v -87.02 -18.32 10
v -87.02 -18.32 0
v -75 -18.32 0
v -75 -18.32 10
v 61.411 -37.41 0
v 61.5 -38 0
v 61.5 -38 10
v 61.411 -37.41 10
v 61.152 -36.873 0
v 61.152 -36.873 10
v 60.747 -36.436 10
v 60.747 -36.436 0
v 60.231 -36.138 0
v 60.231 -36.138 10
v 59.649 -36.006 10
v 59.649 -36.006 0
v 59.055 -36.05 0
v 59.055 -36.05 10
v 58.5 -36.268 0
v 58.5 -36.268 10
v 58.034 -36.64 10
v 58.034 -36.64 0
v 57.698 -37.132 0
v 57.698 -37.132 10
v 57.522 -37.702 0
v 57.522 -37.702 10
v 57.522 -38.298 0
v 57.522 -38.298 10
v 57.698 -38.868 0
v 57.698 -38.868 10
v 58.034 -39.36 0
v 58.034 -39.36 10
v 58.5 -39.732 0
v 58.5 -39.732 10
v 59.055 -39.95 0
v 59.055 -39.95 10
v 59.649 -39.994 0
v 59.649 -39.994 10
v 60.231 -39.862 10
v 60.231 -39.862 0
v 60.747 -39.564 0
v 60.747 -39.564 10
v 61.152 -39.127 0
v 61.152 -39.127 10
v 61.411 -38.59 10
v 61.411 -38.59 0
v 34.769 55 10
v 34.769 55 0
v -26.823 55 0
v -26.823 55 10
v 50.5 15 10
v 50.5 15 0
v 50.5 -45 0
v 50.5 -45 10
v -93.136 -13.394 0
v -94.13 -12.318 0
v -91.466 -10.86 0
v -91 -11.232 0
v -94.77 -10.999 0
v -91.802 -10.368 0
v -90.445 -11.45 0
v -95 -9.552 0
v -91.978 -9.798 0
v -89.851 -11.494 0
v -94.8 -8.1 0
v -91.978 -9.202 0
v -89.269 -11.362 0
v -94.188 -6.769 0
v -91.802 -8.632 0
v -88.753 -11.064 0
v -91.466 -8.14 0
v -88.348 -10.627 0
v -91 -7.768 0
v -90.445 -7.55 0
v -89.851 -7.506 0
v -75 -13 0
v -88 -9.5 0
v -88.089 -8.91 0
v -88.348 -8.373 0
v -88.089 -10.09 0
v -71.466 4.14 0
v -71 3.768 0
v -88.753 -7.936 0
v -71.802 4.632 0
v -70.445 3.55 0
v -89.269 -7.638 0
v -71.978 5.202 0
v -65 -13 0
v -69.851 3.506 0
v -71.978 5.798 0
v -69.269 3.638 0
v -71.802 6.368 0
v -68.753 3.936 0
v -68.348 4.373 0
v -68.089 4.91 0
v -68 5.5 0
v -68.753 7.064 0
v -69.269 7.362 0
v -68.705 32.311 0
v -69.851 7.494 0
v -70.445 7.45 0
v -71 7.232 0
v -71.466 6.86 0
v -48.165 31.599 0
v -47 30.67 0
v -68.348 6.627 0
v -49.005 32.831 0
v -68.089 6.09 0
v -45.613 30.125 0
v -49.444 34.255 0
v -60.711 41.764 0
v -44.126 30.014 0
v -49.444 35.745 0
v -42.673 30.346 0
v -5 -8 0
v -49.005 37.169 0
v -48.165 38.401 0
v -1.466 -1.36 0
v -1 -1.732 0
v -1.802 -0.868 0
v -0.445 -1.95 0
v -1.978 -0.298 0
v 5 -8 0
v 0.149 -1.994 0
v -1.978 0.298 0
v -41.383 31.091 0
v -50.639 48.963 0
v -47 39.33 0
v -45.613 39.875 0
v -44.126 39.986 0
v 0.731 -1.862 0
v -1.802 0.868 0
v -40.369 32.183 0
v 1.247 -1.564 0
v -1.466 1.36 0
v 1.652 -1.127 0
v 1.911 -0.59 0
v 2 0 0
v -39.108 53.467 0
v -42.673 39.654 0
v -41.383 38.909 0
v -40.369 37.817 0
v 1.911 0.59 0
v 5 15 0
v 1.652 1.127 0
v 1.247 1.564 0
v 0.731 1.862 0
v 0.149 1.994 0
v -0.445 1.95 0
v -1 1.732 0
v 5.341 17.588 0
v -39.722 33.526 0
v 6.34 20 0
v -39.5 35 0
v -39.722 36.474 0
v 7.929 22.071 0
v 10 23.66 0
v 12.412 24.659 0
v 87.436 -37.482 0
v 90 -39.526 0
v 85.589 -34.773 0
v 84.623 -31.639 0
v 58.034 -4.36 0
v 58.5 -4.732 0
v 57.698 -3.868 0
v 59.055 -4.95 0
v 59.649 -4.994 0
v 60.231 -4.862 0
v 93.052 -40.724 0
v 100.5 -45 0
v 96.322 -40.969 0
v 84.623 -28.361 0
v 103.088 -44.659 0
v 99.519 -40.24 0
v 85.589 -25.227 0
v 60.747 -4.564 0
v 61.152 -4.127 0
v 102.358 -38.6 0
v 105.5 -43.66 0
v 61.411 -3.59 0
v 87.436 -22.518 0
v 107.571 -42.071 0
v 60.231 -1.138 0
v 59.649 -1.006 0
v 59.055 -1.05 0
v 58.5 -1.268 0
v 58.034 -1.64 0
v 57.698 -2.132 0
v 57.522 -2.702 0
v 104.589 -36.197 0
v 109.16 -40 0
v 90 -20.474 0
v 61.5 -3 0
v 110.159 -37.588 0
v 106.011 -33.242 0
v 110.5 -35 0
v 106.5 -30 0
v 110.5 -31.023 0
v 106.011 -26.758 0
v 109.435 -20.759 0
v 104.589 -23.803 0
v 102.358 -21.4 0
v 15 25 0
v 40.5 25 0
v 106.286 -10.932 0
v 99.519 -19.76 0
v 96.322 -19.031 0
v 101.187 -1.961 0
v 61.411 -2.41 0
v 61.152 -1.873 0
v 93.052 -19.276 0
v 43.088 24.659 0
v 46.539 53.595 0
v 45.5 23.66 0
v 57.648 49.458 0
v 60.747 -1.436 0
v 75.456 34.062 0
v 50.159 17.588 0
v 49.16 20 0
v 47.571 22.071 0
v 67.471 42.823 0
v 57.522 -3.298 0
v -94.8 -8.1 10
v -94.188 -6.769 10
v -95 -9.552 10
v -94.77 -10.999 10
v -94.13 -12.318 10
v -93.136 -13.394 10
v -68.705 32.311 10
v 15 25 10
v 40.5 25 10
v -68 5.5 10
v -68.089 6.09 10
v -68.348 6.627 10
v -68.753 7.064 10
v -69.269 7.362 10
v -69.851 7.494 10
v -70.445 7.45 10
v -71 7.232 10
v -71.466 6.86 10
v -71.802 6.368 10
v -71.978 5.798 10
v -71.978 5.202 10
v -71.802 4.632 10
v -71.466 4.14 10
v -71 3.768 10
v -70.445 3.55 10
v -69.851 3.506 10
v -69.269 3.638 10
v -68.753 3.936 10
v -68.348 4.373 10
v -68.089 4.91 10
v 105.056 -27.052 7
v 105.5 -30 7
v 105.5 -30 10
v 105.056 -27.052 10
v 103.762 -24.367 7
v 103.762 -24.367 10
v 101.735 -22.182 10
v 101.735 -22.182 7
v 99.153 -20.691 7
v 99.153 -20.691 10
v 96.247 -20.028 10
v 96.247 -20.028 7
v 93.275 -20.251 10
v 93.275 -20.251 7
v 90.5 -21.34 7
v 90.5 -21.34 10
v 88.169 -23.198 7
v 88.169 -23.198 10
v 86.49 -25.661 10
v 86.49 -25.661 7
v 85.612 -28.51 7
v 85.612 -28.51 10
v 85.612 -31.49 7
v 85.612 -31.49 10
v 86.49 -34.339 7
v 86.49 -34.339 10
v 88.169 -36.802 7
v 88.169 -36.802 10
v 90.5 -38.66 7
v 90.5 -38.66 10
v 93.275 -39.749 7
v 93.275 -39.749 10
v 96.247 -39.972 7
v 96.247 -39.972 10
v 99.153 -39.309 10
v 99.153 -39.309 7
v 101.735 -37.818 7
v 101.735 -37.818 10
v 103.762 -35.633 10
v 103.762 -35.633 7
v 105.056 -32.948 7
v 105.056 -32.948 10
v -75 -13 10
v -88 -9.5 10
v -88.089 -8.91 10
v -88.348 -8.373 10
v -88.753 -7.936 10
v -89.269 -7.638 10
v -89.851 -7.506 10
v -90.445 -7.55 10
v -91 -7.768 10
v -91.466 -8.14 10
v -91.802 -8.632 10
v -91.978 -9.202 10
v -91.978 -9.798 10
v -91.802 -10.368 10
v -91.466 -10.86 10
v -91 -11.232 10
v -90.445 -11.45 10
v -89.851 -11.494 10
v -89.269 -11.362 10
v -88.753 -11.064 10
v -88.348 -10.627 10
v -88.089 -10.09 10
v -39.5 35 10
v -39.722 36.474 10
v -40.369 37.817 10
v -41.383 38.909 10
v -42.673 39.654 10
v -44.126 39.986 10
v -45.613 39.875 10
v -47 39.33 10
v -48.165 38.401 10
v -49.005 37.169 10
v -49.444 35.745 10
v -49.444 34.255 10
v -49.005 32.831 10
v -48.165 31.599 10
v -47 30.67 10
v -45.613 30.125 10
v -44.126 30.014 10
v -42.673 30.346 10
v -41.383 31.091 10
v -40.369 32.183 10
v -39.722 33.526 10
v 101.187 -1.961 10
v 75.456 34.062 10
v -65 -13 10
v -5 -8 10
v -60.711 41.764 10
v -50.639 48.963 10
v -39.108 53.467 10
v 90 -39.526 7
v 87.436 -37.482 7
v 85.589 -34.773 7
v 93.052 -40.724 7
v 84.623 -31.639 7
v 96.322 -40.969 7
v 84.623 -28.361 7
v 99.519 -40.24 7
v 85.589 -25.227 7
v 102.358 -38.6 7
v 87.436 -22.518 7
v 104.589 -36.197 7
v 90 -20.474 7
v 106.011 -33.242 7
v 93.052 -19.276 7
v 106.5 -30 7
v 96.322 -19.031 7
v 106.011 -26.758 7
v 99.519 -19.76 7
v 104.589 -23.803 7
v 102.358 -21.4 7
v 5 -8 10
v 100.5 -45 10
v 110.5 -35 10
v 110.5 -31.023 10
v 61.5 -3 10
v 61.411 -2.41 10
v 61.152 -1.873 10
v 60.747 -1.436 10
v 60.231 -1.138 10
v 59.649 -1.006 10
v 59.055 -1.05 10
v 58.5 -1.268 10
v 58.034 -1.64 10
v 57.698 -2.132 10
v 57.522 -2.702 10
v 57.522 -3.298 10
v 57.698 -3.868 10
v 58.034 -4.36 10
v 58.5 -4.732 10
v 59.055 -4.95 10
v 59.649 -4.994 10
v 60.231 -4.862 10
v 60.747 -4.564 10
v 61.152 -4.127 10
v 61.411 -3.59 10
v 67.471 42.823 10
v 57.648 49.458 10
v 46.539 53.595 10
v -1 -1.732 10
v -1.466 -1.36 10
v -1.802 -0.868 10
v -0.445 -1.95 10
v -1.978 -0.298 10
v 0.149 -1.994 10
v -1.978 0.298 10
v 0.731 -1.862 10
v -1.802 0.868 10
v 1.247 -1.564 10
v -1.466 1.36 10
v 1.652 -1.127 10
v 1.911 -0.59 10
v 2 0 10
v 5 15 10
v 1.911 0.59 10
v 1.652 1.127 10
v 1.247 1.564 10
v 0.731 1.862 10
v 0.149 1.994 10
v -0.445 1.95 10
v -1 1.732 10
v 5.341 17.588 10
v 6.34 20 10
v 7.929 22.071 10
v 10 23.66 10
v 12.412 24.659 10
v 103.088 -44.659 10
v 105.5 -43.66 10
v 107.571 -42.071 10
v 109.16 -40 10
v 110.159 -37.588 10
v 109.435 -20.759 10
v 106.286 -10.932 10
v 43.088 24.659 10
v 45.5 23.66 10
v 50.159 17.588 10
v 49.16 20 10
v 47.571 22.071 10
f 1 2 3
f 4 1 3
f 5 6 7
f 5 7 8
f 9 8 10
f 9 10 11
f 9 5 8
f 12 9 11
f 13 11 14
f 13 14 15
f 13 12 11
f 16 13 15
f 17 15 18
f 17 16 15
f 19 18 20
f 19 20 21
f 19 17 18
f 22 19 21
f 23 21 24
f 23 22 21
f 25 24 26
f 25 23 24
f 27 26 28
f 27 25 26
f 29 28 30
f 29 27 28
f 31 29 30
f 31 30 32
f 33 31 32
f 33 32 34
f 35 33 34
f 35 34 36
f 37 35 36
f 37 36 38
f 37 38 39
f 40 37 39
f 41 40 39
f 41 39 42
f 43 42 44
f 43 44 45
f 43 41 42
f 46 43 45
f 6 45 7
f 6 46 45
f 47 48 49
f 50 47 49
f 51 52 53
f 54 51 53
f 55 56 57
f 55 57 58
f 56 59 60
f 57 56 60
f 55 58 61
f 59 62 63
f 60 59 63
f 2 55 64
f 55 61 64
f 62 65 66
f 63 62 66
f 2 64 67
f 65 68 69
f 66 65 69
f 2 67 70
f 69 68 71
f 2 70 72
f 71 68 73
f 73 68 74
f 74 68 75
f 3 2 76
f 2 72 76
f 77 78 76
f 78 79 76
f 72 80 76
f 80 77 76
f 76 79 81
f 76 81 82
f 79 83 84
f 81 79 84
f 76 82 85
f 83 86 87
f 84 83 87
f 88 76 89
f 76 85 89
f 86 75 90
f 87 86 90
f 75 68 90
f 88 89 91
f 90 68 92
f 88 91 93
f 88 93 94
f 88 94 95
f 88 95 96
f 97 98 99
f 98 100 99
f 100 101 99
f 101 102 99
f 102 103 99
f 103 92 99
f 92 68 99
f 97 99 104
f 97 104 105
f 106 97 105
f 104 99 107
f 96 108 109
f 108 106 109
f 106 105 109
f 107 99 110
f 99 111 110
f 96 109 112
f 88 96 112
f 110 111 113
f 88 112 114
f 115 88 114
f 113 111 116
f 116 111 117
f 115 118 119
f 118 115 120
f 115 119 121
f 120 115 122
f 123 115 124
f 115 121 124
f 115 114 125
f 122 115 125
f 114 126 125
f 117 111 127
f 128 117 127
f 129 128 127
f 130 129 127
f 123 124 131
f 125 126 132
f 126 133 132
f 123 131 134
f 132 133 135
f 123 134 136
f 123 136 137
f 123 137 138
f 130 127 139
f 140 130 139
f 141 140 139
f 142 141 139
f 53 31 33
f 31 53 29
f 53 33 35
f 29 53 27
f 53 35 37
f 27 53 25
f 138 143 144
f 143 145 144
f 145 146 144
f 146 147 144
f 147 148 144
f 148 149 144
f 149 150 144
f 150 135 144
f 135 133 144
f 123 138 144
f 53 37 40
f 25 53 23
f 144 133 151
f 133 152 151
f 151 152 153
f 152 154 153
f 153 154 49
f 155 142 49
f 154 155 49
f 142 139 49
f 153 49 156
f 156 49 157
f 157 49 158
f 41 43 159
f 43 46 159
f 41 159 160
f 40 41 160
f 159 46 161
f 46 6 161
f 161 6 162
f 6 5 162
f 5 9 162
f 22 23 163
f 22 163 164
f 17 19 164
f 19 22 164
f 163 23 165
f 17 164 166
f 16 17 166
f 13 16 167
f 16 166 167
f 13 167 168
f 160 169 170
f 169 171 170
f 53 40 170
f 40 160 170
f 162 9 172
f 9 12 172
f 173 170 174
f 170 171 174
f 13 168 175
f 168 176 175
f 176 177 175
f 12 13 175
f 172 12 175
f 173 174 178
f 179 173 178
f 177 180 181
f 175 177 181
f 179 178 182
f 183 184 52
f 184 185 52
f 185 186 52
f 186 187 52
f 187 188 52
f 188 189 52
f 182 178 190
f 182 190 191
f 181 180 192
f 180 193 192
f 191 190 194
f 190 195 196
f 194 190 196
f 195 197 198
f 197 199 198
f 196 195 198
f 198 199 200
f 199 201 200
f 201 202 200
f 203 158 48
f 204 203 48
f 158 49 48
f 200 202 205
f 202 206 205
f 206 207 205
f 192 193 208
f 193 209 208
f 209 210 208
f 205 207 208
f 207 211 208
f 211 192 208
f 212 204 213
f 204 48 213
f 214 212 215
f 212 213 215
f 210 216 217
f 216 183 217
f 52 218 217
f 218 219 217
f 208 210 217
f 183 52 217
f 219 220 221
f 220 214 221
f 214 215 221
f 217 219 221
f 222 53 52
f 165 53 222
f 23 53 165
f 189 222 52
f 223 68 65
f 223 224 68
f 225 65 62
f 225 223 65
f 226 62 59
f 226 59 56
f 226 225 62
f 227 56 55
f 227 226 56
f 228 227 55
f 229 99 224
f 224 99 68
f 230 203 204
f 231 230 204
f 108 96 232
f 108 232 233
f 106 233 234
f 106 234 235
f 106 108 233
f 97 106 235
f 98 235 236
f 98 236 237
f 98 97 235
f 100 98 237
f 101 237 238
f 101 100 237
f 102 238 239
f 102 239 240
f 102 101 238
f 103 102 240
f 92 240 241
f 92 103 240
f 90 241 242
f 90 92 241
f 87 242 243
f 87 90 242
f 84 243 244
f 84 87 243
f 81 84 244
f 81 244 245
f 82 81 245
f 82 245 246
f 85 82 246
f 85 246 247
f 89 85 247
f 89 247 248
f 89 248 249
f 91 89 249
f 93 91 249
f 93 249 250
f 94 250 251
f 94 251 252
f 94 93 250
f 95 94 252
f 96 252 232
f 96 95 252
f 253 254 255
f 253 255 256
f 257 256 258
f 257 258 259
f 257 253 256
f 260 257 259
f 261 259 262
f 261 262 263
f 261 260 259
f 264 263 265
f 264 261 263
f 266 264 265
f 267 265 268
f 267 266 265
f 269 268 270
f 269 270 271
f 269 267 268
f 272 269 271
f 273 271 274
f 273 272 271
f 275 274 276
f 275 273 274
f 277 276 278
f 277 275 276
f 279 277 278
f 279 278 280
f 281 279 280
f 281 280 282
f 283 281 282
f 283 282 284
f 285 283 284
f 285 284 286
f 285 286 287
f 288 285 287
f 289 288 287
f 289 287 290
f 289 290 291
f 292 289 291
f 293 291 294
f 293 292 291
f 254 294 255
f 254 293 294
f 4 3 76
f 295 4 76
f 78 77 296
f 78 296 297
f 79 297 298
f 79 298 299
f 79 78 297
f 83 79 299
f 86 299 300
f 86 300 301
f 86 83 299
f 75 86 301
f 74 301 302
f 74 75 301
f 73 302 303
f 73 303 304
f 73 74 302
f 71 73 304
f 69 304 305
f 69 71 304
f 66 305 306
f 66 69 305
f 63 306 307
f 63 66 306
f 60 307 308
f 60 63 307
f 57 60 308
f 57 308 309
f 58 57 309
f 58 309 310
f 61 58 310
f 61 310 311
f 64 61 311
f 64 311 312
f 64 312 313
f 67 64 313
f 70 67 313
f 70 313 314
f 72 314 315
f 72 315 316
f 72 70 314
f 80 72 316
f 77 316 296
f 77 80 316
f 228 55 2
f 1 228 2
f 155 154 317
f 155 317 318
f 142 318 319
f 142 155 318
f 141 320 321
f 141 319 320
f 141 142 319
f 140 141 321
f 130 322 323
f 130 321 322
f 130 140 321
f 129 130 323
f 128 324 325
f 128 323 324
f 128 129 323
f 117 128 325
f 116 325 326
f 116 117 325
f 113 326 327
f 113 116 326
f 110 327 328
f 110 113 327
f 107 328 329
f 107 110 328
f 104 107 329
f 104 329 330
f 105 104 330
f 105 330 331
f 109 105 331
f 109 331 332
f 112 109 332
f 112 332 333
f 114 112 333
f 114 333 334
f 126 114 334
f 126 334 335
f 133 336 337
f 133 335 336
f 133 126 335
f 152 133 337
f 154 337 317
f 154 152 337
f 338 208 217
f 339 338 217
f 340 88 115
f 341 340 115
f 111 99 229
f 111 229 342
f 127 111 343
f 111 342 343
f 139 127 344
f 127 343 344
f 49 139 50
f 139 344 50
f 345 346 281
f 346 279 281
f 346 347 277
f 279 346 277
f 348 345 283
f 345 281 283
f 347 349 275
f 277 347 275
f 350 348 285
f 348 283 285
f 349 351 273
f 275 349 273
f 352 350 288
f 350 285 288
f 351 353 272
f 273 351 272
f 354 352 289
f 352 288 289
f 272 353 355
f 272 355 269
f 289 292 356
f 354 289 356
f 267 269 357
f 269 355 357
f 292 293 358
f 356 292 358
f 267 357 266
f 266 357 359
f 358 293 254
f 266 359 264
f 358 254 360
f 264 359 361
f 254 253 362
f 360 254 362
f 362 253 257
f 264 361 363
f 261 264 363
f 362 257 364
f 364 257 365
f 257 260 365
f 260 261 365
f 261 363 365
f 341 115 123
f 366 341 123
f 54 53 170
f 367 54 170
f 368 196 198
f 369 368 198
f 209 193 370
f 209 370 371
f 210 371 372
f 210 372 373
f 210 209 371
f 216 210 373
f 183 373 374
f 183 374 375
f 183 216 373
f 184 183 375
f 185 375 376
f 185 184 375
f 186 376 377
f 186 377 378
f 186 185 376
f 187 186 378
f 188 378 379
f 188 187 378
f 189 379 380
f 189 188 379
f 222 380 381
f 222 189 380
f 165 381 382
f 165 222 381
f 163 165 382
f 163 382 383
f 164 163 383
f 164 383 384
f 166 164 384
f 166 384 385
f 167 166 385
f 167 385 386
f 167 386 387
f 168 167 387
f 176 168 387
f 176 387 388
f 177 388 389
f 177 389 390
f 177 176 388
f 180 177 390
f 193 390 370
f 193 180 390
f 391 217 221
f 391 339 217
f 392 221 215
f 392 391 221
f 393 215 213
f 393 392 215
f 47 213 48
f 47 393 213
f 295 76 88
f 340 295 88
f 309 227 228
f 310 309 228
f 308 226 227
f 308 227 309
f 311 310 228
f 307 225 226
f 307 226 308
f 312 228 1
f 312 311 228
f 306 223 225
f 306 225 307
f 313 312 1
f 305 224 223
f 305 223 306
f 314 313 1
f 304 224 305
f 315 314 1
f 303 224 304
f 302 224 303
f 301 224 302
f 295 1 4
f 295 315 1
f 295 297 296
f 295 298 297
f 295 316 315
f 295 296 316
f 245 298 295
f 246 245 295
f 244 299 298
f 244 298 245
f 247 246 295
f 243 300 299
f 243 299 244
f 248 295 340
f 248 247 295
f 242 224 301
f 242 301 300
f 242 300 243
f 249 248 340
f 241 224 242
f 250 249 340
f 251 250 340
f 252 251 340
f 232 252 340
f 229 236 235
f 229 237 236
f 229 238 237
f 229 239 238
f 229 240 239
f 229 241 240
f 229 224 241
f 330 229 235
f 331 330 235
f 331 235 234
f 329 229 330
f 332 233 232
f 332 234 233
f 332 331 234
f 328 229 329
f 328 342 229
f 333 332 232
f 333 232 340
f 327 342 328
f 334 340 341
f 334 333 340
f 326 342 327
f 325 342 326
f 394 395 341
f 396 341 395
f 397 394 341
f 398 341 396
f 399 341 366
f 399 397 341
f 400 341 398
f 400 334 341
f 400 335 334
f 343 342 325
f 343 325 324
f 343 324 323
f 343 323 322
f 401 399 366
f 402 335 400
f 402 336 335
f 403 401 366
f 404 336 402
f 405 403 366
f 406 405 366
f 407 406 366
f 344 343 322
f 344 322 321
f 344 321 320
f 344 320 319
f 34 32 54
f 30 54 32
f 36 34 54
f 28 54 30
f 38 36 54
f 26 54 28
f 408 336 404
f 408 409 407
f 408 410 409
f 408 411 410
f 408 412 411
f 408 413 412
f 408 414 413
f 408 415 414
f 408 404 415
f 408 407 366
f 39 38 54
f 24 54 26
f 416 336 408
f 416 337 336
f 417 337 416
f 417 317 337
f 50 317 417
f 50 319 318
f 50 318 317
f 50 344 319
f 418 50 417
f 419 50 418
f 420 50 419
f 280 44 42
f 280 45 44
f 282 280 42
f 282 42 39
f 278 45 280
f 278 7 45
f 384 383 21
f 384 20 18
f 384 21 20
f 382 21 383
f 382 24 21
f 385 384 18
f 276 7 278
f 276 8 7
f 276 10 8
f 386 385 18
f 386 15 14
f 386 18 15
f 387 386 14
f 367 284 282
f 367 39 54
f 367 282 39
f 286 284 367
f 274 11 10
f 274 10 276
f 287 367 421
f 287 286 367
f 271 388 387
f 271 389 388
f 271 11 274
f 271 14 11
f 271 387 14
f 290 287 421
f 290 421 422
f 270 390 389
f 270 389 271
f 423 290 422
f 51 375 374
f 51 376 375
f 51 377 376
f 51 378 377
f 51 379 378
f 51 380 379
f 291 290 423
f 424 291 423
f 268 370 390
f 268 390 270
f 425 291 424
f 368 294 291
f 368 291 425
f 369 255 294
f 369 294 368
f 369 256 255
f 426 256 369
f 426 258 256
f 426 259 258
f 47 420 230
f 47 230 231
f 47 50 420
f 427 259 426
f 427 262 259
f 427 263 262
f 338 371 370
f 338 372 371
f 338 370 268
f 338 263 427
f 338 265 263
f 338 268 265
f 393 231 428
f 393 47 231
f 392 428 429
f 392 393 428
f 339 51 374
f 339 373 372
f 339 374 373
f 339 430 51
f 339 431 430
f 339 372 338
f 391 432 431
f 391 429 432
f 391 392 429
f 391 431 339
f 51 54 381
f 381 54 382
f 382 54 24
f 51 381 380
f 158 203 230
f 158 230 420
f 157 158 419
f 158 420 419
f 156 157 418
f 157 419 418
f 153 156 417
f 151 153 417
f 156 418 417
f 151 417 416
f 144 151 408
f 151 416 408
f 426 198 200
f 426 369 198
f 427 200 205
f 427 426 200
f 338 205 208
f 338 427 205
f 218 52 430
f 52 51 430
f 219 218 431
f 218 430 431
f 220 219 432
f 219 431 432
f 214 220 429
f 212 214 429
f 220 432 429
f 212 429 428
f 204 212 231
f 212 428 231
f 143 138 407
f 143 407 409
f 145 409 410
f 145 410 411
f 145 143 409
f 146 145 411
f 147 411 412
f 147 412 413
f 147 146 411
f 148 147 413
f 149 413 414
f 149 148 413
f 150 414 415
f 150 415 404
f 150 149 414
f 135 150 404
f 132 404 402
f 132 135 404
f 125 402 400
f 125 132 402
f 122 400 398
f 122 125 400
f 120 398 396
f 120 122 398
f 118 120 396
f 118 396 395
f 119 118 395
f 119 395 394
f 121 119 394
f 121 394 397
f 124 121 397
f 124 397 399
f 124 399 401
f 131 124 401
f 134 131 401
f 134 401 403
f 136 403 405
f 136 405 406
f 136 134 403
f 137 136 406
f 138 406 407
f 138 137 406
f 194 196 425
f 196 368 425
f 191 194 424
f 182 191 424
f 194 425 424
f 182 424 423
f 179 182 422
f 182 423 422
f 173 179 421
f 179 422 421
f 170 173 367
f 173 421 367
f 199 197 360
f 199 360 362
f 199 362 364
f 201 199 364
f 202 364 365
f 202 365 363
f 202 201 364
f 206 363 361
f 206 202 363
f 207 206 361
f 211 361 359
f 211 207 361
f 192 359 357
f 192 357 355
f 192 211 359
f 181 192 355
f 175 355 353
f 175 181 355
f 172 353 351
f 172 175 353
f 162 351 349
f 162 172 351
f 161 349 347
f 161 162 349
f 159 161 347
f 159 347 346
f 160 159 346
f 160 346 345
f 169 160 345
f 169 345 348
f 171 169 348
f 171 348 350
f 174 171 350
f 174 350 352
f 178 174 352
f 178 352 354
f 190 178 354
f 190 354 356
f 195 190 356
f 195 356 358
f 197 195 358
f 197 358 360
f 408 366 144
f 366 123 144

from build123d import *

# Parameters (mm, degrees)
SKETCH1_R               = 11
SKETCH1_R_2             = 2
SKETCH1_W               = 10
SKETCH1_H               = 16
BOSS_EXTRUDE1_DEPTH     = 10
FILLET1_R               = 10
FILLET2_R               = 50
FILLET3_R               = 5
BOSS_EXTRUDE2_START     = -3
SKETCH2_R               = 11
SKETCH2_R_2             = 10
BOSS_EXTRUDE2_DEPTH     = 3
CUT_EXTRUDE1_DEPTH      = 124.835576471
CUT_EXTRUDE1_DEPTH_BACK = 124.835576471
SKETCH3_R               = 5


with BuildPart() as part:
    # Sketch1 → Boss-Extrude1 (new body)
    # profile 1 of 2: a face of its own
    with BuildSketch(Plane.XY):
        Polygon((-75, -13), (-65, -13), (-5, -8), (-5, 8), (5, 8), (5, 25), (50.5, 25), (50.5, -45), (76.132488073, -45), (110.5, -45), (110.5, -15), (60.5, 55), (-53.909617462, 55), (-96.658561066, -10.557288279), (-87.02, -18.32), (-75, -18.32), align=None)
        with Locations((95.5, -30)):
            Circle(SKETCH1_R, mode=Mode.SUBTRACT)
        with Locations((59.5, -38)):
            Circle(SKETCH1_R_2, mode=Mode.SUBTRACT)
        with Locations((59.5, -3)):
            Circle(SKETCH1_R_2, mode=Mode.SUBTRACT)
        with Locations((-70, 5.5)):
            Circle(SKETCH1_R_2, mode=Mode.SUBTRACT)
        with Locations((-90, -9.5)):
            Circle(SKETCH1_R_2, mode=Mode.SUBTRACT)
    # profile 2 of 2: a face of its own
    with BuildSketch(Plane.XY):
        Rectangle(SKETCH1_W, SKETCH1_H)
        Circle(SKETCH1_R_2, mode=Mode.SUBTRACT)
    extrude(amount=BOSS_EXTRUDE1_DEPTH)

    # Fillet1
    fillet1_edges = [part.edges().sort_by_distance(p)[0] for p in [
        (110.5, -45, 5),
        (50.5, 25, 5),
        (5, 25, 5),
    ]]
    fillet(fillet1_edges, radius=FILLET1_R)

    # Fillet2
    fillet2_edges = [part.edges().sort_by_distance(p)[0] for p in [
        (-53.909617462, 55, 5),
        (60.5, 55, 5),
        (110.5, -15, 5),
    ]]
    fillet(fillet2_edges, radius=FILLET2_R)

    # Fillet3
    fillet3_edges = [part.edges().sort_by_distance(p)[0] for p in [
        (-96.658561066, -10.557288279, 5),
    ]]
    fillet(fillet3_edges, radius=FILLET3_R)

    # Sketch2 → Boss-Extrude2 (add)
    with BuildSketch(Plane.XY.offset(10).offset(BOSS_EXTRUDE2_START)):
        with Locations((95.5, -30)):
            Circle(SKETCH2_R)
        with Locations((95.5, -30)):
            Circle(SKETCH2_R_2, mode=Mode.SUBTRACT)
    extrude(amount=BOSS_EXTRUDE2_DEPTH)

    # Sketch3 → Cut-Extrude1 (cut, two sides: drawn at the far end of the back side and taken through both)
    with BuildSketch(Plane.XY.offset(10).offset(-CUT_EXTRUDE1_DEPTH_BACK)):
        with Locations((-44.5, 35)):
            Circle(SKETCH3_R)
    extrude(amount=CUT_EXTRUDE1_DEPTH + CUT_EXTRUDE1_DEPTH_BACK, mode=Mode.SUBTRACT)


solid = part.part
